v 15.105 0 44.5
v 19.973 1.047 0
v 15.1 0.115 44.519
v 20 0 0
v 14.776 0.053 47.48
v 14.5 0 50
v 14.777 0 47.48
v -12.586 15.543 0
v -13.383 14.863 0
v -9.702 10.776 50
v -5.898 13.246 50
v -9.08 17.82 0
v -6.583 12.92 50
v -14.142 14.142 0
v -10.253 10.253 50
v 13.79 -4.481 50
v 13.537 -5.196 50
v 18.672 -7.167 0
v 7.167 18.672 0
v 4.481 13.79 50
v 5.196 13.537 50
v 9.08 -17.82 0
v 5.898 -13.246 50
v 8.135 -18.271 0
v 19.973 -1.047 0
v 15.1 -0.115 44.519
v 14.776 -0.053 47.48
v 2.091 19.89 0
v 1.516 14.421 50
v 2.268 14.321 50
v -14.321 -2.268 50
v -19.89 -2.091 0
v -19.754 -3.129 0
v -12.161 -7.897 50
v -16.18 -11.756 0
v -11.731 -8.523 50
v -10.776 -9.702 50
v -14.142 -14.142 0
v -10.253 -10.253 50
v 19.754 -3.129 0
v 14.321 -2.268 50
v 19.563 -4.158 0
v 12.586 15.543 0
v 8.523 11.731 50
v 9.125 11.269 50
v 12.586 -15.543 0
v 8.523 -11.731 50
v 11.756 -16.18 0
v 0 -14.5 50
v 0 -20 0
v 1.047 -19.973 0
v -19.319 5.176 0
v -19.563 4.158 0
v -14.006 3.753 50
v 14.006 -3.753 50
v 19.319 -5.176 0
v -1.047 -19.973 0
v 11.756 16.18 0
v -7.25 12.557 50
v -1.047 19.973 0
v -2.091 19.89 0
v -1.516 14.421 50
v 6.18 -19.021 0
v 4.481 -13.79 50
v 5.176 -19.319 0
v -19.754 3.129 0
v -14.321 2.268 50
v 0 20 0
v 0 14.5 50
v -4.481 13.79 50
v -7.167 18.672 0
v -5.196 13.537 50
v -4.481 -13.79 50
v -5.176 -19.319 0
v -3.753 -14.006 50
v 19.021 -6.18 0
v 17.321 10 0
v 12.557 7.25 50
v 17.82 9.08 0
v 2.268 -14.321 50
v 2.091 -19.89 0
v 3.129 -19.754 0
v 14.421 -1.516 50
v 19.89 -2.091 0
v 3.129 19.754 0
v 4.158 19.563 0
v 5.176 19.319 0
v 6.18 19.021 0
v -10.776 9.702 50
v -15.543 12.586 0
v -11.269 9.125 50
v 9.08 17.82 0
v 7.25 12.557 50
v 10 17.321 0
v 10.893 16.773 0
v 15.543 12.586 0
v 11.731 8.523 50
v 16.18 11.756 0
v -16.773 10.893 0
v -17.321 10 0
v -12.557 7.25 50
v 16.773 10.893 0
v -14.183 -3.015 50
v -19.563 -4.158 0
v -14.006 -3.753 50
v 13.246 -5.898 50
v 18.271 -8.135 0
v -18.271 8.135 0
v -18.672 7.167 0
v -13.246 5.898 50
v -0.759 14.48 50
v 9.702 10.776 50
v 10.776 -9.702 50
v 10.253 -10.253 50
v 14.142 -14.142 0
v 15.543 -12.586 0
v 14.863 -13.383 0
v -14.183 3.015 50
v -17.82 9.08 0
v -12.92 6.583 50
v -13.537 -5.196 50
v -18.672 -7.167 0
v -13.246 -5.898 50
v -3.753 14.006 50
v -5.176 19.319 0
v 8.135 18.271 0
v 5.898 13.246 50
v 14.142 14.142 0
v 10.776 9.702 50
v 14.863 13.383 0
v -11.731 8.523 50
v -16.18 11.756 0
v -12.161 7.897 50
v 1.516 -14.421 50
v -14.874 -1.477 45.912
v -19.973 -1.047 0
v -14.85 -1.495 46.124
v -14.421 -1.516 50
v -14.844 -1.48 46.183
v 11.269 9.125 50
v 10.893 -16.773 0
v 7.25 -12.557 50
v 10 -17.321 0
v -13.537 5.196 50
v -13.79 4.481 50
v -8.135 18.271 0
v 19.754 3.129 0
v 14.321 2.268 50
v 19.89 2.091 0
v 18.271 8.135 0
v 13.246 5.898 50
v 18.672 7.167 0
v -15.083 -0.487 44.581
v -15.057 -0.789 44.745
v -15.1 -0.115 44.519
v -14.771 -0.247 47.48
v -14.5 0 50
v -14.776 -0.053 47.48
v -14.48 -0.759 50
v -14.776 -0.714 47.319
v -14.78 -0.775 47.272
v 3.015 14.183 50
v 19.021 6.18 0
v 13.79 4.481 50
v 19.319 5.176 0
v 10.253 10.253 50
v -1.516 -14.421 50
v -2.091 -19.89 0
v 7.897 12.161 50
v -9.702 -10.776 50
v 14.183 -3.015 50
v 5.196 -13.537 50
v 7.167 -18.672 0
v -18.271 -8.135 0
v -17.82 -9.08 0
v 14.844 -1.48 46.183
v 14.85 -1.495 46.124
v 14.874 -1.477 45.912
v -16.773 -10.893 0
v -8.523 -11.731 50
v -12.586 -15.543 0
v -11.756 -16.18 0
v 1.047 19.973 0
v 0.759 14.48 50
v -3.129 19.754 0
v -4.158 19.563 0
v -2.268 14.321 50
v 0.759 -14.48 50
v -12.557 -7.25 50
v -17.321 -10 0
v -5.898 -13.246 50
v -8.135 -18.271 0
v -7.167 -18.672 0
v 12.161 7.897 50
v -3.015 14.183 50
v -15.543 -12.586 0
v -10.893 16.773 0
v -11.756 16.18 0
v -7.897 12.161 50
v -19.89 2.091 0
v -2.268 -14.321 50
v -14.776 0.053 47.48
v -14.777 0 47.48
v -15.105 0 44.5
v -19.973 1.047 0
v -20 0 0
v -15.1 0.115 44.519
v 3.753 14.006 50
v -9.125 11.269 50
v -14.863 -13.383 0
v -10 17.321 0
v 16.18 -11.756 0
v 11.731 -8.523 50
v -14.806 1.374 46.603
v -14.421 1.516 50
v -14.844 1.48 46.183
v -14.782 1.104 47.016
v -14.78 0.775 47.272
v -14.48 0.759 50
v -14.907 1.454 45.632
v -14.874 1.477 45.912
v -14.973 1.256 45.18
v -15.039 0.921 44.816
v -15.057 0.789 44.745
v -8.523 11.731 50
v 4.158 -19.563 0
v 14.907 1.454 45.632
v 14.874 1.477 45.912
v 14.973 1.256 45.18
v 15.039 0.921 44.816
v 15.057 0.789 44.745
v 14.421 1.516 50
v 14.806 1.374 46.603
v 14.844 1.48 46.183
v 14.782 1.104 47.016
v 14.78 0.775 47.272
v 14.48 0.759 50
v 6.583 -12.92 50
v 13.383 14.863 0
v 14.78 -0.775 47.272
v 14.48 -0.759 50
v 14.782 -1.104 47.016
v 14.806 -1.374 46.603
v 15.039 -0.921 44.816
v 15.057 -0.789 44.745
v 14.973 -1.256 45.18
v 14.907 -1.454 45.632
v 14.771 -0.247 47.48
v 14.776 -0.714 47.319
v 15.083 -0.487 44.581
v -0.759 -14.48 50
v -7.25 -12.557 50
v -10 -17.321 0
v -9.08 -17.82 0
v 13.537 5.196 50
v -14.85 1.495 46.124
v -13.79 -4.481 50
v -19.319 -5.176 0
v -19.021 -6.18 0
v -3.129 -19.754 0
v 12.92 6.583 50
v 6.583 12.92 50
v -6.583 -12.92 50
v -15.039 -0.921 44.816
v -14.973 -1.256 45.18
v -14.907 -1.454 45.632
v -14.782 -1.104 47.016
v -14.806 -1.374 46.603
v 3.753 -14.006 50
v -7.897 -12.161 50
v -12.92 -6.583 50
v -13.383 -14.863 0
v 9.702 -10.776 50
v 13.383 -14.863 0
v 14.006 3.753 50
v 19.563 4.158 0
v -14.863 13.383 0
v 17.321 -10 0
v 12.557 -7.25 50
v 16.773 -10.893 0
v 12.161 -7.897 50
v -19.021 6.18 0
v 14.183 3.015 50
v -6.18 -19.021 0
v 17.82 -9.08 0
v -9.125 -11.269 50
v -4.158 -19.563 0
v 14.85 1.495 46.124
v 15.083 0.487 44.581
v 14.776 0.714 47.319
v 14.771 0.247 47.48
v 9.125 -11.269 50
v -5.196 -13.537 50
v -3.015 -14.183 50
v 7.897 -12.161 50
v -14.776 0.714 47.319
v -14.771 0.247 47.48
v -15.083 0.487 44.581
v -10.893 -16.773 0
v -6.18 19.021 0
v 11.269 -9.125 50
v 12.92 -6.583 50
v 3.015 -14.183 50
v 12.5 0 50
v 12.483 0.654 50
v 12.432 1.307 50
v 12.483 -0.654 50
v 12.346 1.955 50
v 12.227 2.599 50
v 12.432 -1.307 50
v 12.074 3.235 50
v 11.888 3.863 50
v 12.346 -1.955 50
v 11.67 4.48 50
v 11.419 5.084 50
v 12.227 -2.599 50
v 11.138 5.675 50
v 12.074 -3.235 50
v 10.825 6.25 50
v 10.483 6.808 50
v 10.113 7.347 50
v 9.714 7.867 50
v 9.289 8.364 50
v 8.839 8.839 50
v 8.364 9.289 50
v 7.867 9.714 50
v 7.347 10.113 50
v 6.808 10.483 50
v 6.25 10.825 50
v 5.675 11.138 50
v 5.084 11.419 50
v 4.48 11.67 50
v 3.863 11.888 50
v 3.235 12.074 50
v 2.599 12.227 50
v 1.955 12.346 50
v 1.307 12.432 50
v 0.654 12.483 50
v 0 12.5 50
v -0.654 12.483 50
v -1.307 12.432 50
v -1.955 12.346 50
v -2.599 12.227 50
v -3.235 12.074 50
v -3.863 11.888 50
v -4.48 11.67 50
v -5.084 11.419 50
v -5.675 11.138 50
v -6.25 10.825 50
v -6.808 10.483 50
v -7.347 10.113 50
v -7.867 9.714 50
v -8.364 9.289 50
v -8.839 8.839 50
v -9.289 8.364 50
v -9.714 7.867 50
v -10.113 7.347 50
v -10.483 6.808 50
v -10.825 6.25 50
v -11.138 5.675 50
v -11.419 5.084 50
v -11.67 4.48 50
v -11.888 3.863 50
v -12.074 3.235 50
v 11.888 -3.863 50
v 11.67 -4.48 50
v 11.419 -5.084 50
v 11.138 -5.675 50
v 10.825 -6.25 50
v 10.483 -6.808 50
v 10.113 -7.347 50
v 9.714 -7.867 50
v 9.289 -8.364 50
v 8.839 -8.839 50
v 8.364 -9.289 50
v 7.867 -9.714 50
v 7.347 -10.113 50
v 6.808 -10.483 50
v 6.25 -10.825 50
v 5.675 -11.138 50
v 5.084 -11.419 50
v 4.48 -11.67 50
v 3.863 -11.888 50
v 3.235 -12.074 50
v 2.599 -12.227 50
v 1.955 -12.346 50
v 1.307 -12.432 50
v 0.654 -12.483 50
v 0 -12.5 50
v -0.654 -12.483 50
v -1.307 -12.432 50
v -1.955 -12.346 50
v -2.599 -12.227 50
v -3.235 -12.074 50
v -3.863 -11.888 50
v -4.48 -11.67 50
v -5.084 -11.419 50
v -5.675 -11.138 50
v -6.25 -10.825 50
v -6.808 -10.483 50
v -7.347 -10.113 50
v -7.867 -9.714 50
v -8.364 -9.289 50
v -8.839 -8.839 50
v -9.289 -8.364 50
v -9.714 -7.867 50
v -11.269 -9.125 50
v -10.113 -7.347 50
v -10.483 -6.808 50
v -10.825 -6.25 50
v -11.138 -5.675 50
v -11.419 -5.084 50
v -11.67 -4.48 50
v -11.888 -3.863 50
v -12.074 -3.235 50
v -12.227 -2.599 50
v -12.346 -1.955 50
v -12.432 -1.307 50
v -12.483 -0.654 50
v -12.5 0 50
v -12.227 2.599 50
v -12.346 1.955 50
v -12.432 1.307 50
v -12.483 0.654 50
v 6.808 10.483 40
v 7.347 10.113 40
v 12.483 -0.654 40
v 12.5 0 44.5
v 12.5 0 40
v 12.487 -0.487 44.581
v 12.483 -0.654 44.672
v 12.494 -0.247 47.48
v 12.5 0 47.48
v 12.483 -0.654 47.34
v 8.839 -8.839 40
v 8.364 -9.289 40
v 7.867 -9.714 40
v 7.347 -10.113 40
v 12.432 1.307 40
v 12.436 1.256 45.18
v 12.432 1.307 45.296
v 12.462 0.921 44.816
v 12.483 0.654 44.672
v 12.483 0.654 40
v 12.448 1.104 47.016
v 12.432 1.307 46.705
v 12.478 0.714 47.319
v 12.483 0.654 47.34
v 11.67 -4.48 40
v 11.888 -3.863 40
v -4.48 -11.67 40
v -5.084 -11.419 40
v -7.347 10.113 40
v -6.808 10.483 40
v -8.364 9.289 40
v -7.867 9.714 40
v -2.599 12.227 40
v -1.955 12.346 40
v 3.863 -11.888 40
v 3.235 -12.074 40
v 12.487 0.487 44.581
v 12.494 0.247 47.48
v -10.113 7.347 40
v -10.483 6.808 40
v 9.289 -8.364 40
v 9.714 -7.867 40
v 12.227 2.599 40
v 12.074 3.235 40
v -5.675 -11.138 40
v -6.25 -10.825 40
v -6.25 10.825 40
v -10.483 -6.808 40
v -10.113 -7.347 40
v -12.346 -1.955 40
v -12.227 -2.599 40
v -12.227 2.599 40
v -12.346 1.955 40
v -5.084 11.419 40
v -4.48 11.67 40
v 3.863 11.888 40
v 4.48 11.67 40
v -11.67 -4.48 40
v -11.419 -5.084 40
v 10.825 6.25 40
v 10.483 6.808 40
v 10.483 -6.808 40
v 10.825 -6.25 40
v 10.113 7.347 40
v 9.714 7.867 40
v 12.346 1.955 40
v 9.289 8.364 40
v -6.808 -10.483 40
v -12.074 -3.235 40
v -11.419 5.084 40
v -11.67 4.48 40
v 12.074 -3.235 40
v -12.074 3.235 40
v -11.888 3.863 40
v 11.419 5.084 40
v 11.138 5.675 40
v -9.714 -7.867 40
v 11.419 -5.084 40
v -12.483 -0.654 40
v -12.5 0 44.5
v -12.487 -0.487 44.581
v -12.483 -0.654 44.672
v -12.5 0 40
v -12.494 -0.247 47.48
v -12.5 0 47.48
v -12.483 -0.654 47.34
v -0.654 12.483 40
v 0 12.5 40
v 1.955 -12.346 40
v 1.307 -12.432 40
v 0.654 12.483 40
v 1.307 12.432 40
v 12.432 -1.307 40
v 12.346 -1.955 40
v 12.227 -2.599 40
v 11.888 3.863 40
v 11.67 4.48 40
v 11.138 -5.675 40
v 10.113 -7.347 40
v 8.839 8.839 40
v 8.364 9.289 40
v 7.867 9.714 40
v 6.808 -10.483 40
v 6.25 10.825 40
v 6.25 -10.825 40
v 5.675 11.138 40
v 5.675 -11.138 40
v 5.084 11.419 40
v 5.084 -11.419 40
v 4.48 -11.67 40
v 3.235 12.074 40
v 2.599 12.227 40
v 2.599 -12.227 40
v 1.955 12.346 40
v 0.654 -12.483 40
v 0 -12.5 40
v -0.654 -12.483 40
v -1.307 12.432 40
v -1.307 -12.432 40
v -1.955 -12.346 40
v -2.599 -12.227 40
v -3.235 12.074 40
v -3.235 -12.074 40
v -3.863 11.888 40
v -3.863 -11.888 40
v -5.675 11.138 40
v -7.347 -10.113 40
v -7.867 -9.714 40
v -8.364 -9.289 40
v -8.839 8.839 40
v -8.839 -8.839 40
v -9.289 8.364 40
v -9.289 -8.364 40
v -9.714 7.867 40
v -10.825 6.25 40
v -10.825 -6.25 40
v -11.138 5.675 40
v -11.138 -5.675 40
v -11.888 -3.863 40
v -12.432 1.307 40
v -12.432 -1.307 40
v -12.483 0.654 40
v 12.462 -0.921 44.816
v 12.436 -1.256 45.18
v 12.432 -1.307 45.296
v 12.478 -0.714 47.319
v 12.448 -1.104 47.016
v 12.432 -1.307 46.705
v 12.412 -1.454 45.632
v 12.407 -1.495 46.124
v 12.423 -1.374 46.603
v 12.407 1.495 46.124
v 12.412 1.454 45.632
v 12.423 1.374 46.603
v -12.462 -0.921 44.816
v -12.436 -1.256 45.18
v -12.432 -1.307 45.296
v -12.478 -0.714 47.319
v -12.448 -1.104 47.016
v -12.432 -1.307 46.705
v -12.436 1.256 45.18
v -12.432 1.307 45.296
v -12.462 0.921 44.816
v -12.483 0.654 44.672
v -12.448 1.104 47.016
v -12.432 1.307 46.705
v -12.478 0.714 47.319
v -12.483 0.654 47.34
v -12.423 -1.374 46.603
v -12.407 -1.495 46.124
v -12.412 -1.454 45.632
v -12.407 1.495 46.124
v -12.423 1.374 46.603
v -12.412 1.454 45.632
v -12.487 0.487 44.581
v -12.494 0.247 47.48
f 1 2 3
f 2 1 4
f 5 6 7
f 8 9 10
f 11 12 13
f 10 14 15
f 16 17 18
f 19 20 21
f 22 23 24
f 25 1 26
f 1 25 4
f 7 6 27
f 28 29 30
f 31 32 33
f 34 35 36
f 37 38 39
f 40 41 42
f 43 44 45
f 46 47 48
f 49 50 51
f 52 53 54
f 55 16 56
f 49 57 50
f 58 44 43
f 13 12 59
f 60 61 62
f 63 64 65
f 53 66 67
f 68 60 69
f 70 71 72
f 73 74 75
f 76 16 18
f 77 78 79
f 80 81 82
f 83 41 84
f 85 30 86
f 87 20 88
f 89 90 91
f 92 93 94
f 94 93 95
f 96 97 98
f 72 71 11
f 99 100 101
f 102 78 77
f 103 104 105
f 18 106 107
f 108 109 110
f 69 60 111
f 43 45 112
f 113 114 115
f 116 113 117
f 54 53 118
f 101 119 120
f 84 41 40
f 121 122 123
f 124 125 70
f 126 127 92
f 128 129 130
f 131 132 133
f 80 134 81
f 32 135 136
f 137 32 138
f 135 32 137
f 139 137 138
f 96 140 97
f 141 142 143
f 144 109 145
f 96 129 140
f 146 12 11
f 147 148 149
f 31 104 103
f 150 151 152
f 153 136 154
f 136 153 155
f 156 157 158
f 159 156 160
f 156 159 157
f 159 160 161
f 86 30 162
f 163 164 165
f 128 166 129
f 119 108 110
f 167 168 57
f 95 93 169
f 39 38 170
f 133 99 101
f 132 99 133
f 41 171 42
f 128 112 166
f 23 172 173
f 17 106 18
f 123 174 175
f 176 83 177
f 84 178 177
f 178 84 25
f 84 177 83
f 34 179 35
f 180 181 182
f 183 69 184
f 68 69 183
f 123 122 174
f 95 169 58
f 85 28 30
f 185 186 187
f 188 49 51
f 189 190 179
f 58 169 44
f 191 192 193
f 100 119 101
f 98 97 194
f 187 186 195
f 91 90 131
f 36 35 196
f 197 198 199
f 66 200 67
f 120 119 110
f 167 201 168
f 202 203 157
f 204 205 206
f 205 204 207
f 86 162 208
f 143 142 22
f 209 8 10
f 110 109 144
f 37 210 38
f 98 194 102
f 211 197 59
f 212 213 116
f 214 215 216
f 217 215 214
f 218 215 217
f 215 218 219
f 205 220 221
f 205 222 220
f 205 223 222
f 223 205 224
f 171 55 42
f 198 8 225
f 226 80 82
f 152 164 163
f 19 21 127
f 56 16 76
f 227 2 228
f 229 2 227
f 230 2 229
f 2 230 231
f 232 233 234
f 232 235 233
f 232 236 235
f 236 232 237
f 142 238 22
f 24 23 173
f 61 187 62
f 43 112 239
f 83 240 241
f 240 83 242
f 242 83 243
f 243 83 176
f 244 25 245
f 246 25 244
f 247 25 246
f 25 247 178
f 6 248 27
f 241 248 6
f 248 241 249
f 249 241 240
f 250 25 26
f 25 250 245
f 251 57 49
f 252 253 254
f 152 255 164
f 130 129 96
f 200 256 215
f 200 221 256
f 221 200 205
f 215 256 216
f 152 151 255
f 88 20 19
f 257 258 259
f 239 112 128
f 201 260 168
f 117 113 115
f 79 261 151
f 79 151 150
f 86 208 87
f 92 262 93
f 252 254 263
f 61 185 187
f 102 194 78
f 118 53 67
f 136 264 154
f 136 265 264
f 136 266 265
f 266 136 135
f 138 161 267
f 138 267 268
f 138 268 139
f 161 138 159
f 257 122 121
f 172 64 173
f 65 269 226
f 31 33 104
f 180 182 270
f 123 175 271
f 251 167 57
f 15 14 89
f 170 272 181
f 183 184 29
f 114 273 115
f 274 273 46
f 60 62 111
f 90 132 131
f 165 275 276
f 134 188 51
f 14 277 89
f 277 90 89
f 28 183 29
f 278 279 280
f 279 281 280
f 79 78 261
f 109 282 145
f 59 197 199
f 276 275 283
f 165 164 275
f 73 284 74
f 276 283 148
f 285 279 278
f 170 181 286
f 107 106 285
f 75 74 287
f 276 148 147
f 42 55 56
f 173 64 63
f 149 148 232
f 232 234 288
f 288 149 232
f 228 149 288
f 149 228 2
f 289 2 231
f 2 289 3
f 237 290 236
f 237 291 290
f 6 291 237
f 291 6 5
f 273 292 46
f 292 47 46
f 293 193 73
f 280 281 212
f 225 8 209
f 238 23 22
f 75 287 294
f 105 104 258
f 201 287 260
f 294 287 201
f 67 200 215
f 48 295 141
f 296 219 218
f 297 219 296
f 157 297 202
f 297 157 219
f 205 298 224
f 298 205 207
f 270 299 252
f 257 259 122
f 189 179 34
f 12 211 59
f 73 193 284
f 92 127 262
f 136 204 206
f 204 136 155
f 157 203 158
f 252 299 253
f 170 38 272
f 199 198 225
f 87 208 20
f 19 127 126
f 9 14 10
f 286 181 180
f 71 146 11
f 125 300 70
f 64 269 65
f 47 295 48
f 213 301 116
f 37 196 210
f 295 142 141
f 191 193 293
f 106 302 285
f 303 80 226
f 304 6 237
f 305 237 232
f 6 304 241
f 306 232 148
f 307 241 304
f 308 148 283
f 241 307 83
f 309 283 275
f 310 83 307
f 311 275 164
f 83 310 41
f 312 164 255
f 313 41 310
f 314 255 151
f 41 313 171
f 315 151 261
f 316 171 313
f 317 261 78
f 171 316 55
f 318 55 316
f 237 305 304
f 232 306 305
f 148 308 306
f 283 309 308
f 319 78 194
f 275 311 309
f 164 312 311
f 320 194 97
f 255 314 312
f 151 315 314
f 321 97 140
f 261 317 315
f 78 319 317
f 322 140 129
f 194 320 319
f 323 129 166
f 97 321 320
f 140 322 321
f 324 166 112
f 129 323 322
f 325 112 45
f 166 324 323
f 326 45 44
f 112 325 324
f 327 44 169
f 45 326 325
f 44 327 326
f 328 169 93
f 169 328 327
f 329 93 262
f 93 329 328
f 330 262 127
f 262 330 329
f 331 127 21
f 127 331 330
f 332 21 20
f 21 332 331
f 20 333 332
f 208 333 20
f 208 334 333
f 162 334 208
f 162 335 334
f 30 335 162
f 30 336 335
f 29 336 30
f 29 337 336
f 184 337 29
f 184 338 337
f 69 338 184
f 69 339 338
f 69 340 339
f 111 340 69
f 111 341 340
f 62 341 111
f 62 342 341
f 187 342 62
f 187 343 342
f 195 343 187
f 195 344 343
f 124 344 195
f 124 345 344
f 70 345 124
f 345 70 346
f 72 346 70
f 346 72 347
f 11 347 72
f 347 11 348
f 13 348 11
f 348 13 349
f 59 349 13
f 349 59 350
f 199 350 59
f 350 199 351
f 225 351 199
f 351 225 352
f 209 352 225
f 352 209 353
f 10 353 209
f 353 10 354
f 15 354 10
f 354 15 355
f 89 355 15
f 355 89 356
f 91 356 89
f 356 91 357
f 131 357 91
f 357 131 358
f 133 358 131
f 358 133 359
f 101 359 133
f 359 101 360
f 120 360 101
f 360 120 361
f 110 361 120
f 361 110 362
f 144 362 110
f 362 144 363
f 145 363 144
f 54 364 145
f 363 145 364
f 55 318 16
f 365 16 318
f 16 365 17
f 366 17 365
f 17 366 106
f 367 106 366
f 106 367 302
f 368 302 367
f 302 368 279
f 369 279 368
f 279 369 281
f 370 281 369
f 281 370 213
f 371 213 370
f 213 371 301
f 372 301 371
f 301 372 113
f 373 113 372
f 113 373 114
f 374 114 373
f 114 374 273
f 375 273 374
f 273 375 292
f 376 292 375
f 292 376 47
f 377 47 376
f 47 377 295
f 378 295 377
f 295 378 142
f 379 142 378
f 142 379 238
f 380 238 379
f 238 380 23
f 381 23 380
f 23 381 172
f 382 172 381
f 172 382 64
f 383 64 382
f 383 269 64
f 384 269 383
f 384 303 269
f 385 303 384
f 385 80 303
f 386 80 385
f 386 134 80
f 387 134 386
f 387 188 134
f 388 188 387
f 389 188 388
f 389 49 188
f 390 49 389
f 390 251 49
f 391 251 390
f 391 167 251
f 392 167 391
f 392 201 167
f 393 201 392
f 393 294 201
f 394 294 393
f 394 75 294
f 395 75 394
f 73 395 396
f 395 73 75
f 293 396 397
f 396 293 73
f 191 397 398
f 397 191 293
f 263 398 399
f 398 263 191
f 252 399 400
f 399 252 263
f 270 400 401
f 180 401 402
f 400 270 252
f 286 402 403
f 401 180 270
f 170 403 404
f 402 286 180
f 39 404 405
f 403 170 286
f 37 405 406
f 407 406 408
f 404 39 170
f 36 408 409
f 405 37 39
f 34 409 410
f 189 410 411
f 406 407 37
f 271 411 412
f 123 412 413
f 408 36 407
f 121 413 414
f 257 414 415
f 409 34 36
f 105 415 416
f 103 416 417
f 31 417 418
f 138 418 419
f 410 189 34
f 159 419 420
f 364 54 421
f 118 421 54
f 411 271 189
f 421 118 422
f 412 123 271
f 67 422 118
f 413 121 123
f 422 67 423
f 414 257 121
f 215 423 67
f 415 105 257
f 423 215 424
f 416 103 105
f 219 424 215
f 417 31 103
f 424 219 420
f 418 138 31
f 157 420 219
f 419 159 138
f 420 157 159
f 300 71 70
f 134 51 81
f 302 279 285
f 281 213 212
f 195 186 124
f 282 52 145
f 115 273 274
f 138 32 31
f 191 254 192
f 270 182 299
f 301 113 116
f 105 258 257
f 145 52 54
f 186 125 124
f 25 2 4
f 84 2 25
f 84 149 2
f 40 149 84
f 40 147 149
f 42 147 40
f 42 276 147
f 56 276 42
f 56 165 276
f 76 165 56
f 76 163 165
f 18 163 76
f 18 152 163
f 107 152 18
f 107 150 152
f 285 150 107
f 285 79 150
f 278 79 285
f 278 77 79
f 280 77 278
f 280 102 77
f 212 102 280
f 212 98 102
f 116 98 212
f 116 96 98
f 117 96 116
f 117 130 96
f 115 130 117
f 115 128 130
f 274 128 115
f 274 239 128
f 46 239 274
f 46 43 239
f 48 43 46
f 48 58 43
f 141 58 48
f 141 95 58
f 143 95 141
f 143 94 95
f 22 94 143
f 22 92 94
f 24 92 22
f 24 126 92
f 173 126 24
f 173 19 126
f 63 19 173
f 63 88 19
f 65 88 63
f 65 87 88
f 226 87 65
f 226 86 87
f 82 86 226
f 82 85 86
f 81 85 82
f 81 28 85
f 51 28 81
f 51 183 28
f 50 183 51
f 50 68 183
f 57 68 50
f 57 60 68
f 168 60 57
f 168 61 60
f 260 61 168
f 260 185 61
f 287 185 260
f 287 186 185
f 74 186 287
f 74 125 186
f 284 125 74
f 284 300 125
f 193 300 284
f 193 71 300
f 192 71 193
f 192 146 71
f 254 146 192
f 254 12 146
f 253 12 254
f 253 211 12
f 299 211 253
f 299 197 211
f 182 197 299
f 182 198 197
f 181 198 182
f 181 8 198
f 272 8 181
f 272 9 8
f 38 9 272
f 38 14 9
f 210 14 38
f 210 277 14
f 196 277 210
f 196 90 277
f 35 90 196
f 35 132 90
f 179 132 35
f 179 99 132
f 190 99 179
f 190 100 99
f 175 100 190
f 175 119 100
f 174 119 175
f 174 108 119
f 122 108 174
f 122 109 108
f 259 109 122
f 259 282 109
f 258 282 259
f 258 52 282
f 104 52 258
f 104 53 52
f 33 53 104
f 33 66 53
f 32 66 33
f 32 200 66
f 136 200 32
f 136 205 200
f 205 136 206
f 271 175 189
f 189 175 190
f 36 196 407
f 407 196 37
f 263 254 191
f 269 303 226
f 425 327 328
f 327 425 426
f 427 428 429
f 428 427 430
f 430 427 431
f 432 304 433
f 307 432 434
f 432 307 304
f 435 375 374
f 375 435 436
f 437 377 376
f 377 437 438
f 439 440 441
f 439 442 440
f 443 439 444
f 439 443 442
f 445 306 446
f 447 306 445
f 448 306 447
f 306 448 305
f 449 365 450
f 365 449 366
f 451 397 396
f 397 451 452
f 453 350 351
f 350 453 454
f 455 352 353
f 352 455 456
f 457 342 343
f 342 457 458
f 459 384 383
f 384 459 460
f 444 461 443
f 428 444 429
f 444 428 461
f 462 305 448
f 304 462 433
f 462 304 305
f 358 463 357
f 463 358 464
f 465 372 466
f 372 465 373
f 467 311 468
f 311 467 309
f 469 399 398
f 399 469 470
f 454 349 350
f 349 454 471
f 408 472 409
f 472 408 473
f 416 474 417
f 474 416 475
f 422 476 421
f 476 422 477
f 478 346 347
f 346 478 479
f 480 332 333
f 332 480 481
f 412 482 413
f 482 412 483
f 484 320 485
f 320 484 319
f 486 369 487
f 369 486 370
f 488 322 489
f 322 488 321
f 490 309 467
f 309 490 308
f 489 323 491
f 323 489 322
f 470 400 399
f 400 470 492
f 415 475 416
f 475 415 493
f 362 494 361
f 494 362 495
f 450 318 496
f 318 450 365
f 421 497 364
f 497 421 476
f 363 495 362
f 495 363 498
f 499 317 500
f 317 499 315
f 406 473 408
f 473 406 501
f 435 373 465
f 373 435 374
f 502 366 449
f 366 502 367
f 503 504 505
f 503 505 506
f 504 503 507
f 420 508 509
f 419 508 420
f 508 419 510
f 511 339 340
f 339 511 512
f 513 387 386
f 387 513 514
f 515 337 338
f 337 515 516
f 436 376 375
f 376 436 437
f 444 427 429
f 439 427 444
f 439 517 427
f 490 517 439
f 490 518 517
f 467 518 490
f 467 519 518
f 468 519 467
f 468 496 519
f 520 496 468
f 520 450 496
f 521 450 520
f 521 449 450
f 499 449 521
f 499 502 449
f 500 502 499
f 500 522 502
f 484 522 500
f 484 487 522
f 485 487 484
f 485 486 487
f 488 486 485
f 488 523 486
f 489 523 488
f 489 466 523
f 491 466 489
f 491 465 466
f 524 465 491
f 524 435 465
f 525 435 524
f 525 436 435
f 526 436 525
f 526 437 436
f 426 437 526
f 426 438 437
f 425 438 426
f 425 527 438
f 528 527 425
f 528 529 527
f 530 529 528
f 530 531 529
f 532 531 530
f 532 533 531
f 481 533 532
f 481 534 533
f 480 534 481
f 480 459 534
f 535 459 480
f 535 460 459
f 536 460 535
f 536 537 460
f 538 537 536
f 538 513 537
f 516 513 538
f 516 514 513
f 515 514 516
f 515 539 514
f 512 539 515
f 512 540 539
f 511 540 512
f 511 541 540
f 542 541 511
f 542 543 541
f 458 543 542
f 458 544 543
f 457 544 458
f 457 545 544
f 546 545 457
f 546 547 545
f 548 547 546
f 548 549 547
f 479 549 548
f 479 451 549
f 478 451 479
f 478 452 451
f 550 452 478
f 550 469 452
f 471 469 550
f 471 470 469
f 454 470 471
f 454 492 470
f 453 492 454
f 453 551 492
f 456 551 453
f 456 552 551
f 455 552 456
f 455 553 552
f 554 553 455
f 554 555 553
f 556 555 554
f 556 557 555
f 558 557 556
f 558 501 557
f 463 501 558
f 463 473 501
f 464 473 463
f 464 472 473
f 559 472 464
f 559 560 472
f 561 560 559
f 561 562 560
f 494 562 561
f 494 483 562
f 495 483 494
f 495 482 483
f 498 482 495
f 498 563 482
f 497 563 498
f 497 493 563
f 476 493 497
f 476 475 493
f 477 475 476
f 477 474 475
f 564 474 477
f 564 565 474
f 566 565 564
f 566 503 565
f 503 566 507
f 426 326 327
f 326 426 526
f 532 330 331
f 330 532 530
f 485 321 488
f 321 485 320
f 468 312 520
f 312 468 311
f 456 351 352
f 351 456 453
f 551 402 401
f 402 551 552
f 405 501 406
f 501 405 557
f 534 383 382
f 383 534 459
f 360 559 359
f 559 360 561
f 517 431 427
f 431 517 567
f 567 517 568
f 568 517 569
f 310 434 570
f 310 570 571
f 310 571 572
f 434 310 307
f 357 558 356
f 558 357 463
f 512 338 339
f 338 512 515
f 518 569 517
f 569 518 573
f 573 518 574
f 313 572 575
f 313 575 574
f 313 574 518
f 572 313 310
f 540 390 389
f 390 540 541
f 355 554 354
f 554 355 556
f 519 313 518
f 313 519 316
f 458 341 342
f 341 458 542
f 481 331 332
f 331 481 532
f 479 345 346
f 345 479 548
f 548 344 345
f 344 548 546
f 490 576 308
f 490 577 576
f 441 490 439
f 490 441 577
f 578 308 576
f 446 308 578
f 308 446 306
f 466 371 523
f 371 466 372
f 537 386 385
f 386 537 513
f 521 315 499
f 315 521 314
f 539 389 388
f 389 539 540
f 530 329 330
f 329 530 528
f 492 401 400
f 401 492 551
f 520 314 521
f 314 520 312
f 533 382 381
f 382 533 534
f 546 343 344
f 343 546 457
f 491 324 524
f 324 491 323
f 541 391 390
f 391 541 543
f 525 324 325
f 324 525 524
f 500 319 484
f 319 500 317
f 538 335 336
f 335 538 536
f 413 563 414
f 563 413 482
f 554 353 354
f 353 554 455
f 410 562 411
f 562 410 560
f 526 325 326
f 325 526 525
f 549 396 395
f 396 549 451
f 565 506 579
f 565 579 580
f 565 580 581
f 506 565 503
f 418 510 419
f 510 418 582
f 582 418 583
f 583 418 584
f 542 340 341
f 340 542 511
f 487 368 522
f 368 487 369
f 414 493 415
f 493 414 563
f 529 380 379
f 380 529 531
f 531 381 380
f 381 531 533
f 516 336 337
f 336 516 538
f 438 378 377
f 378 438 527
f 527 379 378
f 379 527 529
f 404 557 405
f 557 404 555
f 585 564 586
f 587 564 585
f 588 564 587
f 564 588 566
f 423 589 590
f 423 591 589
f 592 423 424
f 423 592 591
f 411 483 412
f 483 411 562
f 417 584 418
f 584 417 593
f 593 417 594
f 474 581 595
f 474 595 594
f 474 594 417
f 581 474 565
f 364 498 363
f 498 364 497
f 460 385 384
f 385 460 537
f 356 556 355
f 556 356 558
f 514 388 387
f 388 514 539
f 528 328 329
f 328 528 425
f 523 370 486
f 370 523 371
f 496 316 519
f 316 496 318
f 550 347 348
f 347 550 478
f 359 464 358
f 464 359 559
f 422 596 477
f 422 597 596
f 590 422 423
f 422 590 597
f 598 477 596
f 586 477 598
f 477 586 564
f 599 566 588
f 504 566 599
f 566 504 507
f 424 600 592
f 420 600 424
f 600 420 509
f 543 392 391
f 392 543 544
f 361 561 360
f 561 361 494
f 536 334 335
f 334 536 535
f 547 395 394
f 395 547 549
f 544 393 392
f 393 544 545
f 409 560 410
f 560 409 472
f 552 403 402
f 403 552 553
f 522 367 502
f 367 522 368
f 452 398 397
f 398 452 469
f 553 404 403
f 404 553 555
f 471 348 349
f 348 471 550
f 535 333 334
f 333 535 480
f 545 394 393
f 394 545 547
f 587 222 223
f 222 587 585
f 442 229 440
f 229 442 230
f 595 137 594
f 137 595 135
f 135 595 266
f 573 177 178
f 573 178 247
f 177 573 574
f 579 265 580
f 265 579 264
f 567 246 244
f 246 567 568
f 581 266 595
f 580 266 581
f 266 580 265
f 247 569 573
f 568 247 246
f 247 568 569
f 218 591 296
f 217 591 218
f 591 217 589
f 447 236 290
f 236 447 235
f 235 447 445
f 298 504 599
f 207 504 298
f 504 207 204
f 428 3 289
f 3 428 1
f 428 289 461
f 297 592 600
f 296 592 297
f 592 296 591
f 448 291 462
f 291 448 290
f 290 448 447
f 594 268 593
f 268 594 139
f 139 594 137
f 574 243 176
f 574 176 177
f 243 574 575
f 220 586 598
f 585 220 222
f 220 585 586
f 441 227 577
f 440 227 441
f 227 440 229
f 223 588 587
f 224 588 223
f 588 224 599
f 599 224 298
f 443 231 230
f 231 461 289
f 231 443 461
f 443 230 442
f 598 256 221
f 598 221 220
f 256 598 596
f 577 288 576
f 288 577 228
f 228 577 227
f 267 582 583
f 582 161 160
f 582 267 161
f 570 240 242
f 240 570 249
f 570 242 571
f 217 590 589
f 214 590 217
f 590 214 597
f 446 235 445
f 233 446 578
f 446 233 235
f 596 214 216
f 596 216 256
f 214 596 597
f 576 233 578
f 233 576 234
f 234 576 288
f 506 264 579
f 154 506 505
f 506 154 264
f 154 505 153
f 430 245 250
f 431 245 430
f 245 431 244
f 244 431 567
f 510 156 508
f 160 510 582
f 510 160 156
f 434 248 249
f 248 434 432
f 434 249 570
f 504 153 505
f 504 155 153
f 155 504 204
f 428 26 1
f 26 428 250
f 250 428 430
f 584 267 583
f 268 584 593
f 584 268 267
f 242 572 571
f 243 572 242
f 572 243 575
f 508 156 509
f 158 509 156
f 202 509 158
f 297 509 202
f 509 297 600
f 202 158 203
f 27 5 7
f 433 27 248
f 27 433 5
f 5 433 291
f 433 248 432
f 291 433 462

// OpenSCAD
$fs=$fs/4;
$fa=$fa/4;

h=40;
module pied(r){
    difference(){
        cylinder( h+10, 20, r+2);
        translate([0,0,h]) cylinder( 100, r, r);
        translate([0,0,h+6]) rotate([0,90,0])cylinder( 100, r=1.5, center=true);
    };
}

//pied(20/2);
pied(25/2);
